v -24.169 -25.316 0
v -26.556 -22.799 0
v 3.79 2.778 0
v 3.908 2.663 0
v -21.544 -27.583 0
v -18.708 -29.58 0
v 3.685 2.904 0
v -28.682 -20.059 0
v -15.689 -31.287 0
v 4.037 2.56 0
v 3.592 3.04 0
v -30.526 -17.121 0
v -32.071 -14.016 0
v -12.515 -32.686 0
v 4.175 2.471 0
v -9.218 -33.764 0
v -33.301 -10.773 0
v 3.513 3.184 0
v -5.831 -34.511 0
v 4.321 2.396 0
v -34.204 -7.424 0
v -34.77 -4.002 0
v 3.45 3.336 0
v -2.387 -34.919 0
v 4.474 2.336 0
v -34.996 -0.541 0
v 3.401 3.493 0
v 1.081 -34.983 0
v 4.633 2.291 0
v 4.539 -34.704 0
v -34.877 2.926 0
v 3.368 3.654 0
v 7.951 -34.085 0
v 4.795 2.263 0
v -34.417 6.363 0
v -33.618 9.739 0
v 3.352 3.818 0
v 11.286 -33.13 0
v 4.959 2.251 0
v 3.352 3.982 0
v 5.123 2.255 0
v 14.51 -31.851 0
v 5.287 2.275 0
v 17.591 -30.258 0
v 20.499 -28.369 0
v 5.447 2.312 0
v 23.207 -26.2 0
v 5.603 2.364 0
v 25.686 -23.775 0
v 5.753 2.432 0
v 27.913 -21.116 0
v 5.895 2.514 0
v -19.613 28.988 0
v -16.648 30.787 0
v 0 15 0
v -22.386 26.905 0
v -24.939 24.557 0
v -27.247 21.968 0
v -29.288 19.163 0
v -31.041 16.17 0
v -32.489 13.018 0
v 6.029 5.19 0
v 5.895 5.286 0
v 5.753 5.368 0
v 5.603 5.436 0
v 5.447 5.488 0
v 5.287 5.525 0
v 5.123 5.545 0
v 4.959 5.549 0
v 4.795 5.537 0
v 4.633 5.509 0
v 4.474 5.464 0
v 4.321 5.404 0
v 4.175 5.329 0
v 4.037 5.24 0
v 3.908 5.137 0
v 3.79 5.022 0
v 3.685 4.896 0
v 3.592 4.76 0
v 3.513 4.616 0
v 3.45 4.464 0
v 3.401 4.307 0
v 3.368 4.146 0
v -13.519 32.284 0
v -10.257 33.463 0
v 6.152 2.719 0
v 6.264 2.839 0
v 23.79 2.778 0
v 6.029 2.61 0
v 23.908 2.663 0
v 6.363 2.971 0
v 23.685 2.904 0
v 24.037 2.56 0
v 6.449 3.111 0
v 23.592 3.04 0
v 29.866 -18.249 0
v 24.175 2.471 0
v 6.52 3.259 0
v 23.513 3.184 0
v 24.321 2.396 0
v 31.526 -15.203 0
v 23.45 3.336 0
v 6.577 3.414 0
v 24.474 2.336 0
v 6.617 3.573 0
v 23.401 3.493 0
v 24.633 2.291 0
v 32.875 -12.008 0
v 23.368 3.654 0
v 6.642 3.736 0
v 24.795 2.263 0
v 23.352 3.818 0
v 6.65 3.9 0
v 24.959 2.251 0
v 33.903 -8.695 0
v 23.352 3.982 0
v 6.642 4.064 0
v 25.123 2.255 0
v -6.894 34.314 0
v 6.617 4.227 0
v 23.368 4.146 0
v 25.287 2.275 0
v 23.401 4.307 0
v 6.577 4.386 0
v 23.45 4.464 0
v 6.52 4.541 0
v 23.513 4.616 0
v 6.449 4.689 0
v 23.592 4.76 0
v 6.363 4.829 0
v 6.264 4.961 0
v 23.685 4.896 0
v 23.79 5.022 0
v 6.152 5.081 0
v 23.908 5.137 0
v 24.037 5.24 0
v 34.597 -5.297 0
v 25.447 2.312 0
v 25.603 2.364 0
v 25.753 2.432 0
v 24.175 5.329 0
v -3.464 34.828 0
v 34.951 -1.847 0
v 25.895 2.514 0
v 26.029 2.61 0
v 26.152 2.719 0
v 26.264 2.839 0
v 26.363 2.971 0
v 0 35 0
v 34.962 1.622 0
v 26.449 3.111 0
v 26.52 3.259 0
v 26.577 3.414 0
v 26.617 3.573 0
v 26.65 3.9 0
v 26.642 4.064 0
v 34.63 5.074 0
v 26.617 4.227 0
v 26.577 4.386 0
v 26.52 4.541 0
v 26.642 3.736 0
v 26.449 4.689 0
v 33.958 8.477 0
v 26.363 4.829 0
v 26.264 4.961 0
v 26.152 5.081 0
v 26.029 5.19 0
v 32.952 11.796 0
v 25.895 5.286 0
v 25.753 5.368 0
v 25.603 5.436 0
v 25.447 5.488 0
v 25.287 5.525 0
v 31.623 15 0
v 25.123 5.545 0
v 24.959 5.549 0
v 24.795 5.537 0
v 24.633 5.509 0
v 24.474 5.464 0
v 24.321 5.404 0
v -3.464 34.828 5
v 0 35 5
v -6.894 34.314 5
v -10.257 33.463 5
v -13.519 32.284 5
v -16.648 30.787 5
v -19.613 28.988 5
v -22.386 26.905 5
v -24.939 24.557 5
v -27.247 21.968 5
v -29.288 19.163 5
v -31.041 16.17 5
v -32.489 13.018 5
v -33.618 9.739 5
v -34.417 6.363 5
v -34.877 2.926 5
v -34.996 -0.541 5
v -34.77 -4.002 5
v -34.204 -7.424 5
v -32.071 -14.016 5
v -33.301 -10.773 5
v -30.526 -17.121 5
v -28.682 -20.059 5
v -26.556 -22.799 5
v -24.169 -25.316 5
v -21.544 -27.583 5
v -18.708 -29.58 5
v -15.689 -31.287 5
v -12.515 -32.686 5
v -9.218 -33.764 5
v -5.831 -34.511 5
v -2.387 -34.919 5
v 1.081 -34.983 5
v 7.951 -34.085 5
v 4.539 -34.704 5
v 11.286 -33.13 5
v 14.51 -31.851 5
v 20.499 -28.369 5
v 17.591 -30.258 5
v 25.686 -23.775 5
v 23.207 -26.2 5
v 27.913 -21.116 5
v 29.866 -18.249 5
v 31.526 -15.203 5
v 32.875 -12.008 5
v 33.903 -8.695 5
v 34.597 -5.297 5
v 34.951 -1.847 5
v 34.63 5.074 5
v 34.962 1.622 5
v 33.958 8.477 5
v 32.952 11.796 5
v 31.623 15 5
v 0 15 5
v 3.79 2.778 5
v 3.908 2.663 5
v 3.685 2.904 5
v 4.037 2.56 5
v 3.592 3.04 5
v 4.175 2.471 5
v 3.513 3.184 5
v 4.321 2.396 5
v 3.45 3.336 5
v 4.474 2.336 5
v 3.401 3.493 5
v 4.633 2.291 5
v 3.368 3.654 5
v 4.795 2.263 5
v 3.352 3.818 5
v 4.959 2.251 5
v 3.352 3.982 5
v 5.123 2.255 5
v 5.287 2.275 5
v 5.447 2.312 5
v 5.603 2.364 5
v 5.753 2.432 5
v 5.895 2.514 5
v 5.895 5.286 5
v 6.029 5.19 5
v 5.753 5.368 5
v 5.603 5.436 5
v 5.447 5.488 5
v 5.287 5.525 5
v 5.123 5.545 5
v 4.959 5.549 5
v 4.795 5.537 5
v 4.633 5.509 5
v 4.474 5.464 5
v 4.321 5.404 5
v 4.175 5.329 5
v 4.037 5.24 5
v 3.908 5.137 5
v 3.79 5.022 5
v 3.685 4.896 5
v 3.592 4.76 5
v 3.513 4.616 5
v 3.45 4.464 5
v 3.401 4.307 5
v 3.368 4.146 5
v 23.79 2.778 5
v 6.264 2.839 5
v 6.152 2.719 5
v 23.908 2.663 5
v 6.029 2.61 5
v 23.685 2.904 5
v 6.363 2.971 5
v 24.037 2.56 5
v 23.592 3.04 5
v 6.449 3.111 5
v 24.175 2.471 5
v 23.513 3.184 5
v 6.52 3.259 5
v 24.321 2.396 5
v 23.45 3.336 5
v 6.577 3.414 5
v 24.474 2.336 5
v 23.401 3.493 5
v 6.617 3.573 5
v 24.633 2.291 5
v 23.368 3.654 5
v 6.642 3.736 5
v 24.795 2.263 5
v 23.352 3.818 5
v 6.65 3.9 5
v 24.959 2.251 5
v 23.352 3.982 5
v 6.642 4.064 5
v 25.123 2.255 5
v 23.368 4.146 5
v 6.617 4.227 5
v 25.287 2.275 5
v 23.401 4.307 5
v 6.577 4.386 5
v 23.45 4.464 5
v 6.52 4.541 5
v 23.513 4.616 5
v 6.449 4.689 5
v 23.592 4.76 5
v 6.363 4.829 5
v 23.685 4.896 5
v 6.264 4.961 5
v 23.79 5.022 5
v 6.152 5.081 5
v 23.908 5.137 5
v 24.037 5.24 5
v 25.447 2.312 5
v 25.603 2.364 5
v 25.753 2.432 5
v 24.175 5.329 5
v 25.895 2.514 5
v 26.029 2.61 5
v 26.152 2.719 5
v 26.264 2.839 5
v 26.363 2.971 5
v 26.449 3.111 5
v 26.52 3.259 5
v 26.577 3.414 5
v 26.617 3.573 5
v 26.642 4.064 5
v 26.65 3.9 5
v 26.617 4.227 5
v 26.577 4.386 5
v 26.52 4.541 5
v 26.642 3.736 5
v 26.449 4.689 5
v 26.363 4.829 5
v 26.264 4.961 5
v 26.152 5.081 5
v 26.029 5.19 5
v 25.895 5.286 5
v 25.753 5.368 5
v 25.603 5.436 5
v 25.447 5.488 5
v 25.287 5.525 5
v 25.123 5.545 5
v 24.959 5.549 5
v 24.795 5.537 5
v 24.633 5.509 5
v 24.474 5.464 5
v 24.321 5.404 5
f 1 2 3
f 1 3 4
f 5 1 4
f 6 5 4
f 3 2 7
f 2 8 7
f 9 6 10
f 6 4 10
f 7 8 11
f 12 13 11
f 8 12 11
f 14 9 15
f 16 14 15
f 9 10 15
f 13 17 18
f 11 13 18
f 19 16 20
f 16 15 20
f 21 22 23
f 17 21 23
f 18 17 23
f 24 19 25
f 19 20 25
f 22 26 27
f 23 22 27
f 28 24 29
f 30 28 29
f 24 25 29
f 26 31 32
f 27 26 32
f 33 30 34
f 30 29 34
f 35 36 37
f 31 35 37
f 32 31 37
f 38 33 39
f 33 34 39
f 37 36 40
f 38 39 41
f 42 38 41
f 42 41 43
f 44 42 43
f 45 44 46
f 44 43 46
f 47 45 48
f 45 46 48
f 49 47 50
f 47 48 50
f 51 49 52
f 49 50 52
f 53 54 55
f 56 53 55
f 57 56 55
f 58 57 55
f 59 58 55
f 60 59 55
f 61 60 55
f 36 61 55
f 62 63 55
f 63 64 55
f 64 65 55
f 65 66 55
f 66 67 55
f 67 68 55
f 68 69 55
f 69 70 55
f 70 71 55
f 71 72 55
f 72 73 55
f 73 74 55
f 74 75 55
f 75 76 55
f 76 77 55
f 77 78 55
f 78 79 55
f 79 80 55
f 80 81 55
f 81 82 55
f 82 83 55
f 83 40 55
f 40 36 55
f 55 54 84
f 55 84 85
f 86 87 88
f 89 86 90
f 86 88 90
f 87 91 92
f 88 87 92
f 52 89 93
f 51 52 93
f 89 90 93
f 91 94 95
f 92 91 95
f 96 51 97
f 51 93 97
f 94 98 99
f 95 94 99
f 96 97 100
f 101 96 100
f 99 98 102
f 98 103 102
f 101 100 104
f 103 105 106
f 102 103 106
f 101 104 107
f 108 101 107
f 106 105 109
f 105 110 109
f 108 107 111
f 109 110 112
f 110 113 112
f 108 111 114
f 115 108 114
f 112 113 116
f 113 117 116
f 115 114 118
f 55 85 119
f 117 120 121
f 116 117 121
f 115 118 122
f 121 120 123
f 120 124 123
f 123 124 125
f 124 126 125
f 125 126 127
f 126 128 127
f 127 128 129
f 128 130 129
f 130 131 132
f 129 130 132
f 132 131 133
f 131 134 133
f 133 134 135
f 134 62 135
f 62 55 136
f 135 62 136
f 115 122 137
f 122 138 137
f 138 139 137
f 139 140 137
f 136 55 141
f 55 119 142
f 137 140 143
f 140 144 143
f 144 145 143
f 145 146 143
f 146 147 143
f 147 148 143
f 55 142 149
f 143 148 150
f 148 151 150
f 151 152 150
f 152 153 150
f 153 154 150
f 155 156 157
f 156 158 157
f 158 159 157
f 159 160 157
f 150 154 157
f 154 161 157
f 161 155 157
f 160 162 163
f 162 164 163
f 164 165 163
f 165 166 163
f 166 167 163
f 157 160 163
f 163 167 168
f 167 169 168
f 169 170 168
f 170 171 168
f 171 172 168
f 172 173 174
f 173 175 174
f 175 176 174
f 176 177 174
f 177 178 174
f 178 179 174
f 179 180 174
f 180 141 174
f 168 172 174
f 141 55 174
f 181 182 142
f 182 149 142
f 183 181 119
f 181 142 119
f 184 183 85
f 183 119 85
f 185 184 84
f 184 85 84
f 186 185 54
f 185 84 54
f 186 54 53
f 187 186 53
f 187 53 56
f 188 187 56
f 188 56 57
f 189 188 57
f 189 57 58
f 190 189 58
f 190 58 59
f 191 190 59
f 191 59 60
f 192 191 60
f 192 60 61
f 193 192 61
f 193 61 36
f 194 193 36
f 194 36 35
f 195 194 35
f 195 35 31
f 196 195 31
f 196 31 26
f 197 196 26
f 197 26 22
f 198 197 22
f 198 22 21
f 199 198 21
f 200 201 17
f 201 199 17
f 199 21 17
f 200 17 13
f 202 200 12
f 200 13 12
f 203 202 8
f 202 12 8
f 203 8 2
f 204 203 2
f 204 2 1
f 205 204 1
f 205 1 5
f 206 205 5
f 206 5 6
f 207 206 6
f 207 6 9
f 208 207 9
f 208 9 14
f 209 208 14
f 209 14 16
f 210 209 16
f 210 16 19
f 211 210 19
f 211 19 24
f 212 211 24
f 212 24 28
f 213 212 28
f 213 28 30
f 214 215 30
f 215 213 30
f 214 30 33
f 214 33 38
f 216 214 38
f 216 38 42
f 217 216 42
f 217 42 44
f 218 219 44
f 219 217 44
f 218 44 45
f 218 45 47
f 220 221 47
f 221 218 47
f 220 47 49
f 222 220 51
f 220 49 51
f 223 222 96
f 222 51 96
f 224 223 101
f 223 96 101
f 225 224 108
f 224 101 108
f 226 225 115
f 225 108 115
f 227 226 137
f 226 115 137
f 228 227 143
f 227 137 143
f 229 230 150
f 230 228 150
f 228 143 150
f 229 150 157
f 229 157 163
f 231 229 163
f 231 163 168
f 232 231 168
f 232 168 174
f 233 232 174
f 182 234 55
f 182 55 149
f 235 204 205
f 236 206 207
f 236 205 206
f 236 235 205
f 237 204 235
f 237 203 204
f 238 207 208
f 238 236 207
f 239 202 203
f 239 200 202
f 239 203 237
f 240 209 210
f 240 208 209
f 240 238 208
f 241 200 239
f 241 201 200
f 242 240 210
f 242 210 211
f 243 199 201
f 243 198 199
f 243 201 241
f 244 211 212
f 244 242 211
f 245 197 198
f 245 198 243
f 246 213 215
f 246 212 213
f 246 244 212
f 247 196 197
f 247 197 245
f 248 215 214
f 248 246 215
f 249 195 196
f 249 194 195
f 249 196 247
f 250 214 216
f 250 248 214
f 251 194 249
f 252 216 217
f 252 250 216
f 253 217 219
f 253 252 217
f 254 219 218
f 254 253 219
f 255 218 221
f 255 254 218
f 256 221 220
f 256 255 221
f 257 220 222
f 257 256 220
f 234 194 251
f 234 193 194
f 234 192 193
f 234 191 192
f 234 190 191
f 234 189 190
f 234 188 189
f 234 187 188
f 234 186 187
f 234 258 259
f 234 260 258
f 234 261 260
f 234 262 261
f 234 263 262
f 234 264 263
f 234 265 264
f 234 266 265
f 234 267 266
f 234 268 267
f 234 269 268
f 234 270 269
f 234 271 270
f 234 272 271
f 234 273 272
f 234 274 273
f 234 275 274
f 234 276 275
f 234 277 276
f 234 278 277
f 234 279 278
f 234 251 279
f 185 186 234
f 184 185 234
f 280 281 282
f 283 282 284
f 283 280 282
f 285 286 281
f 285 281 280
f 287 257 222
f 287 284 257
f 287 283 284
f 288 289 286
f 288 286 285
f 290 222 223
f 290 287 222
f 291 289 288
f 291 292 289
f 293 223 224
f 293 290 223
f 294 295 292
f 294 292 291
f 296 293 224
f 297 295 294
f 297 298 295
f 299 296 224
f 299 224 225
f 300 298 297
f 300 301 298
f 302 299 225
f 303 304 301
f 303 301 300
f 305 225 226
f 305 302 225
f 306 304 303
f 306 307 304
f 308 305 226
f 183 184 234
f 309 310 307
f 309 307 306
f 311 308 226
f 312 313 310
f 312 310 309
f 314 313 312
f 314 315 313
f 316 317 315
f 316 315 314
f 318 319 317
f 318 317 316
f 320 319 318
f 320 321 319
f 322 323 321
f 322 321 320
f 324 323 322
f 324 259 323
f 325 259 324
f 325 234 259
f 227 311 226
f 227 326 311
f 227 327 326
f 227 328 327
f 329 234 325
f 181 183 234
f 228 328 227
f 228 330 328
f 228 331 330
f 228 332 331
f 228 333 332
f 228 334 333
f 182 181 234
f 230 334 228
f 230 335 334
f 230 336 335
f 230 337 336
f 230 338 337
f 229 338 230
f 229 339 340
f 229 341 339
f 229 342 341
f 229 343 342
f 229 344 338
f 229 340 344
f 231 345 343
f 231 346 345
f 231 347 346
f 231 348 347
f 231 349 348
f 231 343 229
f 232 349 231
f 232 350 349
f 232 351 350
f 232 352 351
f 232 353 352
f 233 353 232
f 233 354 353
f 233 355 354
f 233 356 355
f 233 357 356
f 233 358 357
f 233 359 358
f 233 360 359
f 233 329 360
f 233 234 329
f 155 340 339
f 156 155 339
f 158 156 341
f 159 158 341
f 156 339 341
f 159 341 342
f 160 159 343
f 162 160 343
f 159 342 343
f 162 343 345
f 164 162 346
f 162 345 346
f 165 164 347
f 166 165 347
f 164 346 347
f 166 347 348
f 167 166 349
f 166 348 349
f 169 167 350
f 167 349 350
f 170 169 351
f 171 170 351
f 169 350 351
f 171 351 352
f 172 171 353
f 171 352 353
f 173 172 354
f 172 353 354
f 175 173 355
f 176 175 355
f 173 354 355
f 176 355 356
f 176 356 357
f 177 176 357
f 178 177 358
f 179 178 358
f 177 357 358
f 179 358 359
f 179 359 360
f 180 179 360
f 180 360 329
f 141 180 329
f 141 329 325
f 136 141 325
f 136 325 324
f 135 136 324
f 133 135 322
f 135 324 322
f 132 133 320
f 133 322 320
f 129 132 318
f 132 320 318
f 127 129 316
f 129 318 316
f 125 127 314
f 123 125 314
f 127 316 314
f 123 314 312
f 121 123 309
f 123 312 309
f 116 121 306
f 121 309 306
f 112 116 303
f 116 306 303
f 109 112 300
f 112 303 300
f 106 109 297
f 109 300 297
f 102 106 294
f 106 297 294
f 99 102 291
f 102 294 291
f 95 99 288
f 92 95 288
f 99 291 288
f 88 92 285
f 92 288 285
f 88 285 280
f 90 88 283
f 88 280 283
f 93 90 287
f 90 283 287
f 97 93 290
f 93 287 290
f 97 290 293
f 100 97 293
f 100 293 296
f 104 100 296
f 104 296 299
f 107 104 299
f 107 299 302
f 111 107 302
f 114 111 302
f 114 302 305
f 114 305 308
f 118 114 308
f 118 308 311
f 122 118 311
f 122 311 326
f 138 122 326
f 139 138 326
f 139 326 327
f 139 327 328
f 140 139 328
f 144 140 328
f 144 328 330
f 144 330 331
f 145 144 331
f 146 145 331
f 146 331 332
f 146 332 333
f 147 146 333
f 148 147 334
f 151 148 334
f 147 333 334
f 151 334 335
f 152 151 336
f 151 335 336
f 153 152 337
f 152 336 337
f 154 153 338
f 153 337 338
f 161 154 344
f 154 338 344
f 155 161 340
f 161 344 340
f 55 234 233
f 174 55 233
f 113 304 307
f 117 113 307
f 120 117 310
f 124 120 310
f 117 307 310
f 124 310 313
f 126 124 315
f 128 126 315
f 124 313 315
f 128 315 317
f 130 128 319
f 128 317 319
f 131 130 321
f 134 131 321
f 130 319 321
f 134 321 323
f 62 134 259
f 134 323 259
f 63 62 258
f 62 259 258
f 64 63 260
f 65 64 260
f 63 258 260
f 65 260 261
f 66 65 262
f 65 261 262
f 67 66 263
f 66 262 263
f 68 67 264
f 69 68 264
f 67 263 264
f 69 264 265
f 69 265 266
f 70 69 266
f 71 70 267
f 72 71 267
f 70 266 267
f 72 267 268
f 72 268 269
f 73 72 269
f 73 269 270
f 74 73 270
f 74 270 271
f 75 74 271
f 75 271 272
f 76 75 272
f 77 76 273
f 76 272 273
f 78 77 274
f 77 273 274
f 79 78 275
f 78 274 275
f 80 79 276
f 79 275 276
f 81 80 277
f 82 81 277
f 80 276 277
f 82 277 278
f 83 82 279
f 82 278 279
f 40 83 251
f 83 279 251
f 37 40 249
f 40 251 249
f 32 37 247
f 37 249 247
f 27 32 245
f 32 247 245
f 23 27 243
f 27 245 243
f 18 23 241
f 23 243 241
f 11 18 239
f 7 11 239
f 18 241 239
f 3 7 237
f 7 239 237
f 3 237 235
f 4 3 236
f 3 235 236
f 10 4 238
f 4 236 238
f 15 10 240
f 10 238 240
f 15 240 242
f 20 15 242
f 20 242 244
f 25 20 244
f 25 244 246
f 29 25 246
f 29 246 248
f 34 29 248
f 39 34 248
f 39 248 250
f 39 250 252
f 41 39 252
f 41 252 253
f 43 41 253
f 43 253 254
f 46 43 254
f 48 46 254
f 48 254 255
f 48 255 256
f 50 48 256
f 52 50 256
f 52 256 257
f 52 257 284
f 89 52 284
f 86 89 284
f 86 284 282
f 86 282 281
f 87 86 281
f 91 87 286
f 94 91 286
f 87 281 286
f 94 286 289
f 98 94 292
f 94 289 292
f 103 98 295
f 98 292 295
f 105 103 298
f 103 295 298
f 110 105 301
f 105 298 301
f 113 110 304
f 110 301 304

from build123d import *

# Parameters (mm, degrees)
SKETCH2_R           = 35
BOSS_EXTRUDE1_DEPTH = 5
SKETCH4_R           = 1.65
SKETCH4_W           = 60
SKETCH4_H           = 20
CUT_EXTRUDE1_DEPTH  = 5


with BuildPart() as part:
    # Sketch2 → Boss-Extrude1 (new body)
    with BuildSketch(Plane.XY):
        Circle(SKETCH2_R)
    extrude(amount=BOSS_EXTRUDE1_DEPTH)

    # Sketch4 → Cut-Extrude1 (cut)
    with BuildSketch(Plane.XY.offset(5)):
        with Locations((5, 3.9)):
            Circle(SKETCH4_R)
        with Locations((25, 3.9)):
            Circle(SKETCH4_R)
        with Locations((30, 25)):
            Rectangle(SKETCH4_W, SKETCH4_H)
    extrude(amount=-CUT_EXTRUDE1_DEPTH, mode=Mode.SUBTRACT)


solid = part.part
